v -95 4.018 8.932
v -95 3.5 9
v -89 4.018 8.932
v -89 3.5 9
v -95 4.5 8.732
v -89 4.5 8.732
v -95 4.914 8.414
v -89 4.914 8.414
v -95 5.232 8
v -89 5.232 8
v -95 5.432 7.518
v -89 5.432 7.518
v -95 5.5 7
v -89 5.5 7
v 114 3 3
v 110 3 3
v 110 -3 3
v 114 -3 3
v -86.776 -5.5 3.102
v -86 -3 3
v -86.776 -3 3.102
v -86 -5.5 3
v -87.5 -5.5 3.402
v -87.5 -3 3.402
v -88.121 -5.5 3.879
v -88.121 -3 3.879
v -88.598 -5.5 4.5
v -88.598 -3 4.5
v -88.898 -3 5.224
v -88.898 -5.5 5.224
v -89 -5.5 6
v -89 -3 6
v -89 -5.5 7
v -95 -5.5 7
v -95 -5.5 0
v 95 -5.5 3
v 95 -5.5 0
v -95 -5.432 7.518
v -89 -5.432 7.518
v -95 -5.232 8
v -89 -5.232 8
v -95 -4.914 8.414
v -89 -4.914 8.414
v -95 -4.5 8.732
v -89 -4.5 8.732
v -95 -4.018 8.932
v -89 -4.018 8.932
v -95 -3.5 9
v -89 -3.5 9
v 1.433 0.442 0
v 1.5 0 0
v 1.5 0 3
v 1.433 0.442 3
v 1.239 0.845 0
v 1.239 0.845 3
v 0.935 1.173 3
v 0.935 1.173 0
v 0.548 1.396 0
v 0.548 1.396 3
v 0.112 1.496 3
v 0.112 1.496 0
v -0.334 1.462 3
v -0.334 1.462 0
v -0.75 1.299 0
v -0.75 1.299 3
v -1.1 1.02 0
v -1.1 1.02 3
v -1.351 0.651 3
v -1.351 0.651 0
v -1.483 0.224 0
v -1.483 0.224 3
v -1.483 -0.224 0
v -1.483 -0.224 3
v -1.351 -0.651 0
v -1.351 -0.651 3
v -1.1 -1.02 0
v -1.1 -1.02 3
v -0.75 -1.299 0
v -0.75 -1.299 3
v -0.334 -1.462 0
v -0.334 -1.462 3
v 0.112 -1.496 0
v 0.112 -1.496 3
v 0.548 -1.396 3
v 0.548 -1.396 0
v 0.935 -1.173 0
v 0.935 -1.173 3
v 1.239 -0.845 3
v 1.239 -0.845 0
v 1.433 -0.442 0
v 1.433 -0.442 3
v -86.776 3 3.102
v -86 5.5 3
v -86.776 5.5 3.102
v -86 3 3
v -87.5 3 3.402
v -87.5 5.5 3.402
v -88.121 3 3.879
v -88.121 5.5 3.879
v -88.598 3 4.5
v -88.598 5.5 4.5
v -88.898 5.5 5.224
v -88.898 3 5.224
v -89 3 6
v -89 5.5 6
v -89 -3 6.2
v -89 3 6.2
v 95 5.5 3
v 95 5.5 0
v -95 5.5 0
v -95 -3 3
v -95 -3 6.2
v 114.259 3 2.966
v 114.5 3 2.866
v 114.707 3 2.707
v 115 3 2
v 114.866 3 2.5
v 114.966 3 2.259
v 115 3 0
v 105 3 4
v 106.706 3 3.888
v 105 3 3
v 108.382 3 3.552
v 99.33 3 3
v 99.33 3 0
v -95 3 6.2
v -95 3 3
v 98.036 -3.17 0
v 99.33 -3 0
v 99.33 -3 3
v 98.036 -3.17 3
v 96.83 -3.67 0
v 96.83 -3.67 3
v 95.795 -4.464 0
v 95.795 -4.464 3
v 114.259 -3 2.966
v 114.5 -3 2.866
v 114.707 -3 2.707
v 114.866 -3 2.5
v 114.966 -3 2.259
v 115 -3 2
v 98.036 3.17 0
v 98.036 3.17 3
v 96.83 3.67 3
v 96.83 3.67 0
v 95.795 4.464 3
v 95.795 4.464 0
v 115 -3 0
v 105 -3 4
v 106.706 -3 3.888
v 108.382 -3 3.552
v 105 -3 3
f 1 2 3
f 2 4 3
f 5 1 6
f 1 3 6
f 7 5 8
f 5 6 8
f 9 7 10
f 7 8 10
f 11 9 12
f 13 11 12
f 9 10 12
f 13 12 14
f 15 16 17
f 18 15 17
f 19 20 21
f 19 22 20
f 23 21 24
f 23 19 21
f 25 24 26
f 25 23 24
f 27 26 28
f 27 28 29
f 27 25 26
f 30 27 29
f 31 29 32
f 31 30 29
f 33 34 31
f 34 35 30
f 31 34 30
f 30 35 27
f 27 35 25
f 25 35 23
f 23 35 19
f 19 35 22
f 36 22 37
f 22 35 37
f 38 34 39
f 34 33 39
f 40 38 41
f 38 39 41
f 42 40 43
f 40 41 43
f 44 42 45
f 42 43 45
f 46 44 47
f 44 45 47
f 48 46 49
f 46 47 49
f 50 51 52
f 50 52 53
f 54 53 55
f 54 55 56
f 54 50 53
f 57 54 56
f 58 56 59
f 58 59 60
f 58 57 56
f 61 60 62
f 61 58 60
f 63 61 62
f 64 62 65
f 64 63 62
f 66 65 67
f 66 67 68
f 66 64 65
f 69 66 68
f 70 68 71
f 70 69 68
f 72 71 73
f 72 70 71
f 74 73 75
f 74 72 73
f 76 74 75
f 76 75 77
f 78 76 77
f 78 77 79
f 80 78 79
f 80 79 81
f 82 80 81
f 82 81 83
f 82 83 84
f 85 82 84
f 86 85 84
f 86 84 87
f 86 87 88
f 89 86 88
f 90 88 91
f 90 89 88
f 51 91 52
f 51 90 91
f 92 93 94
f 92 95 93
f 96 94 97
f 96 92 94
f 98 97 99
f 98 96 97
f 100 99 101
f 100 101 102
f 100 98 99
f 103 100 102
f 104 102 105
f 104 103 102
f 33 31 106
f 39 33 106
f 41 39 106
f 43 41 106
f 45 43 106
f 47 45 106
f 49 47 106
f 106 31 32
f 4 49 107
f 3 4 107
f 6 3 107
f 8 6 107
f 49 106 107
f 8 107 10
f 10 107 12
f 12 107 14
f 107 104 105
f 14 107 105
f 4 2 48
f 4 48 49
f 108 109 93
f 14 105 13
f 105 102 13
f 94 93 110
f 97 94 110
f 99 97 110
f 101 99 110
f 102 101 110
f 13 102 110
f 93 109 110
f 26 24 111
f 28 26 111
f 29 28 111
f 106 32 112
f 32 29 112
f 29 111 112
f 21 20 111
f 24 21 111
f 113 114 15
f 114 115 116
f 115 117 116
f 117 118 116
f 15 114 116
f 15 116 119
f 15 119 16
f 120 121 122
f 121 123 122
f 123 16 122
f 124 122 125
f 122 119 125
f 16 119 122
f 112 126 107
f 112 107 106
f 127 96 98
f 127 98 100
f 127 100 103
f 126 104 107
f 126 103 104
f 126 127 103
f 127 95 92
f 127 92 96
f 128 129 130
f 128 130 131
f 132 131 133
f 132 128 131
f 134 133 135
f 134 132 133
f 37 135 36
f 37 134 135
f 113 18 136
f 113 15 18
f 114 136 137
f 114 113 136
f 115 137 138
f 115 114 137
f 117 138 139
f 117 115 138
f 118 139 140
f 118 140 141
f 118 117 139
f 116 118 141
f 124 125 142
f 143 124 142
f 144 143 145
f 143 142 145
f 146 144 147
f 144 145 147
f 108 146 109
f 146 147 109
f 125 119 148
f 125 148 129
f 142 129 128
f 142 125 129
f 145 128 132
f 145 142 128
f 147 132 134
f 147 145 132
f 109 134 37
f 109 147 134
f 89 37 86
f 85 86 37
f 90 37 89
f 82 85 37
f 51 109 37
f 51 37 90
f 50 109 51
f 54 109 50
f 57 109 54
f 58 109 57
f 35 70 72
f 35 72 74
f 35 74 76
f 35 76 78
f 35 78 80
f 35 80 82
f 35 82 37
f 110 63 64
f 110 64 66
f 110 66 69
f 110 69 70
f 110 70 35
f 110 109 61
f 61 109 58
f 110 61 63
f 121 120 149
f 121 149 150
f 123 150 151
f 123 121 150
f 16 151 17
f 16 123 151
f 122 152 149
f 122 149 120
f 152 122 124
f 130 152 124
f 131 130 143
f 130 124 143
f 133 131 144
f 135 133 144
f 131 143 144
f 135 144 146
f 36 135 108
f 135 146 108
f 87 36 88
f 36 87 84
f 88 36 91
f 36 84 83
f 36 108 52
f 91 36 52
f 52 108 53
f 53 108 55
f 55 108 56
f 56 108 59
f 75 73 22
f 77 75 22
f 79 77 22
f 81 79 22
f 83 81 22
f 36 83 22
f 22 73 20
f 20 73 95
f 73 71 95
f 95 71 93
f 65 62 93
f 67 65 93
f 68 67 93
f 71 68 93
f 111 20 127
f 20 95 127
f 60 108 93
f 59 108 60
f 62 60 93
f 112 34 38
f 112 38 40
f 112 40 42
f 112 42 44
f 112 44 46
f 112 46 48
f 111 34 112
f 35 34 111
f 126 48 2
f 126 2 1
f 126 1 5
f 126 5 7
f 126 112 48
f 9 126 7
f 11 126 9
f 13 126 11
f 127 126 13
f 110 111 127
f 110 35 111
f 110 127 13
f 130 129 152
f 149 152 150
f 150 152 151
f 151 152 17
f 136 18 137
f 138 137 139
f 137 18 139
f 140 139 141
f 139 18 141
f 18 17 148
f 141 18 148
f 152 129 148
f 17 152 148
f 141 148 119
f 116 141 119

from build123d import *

# Parameters (mm, degrees)
F0_W         = 6
F0_H         = 11
F0_R         = 1.5
F1_DEPTH     = 3
F2_DEPTH     = 9
F3_W         = 6
F3_H         = 3.2
F4_DEPTH     = 15
F5_W         = 5
F5_H         = 6
F6_DEPTH     = 1
F7_T1_DEPTH  = 31
F8_R         = 3
F9_R         = 1
F10_T1_DEPTH = 3
F11_R        = 2


# Not quite as in the source:
# - a fillet or chamfer that OpenCascade refuses, or shapes differently, is made with other operations: its cross-section is extruded or revolved along the edge and cut away or added


with BuildPart() as f1:
    # F0 (on Top) → F1 (new body)
    with BuildSketch(Plane.XY):
        with Locations((-92, 0)):
            Rectangle(F0_W, F0_H)
        Polygon((-89, -5.5), (95, -5.5), (95, -3), (115, -3), (115, 3), (95, 3), (95, 5.5), (-89, 5.5), align=None)
        Circle(F0_R, mode=Mode.SUBTRACT)
    extrude(amount=F1_DEPTH)

    # F0 (on Top) → F2 (join)
    with BuildSketch(Plane.XY):
        with Locations((-92, 0)):
            Rectangle(F0_W, F0_H)
    extrude(amount=F2_DEPTH)

    # F3 (on face) → F4 (cut, symmetric)
    with BuildSketch(Plane(origin=(-95, 0, 0), x_dir=(0, -1, 0), z_dir=(-1, 0, 0))):
        with Locations((0, 4.6)):
            Rectangle(F3_W, F3_H)
    extrude(amount=F4_DEPTH, both=True, mode=Mode.SUBTRACT)

    # F5 (on face) → F6 (join)
    with BuildSketch(Plane.XY.offset(3)):
        with Locations((107.5, 0)):
            Rectangle(F5_W, F5_H)
    extrude(amount=F6_DEPTH)

    # F7: fillet of radius 13 on 1 edges, made by hand

    # F7_s2 → F7_t1 (cut)
    with BuildSketch(Plane.XZ.offset(-15.5)):
        with BuildLine():
            ThreePointArc((105, 4), (107.5495097568, 3.747548784), (110, 3))
            Line((110, 3), (110, 4))
            Line((110, 4), (105, 4))
        make_face()
    extrude(amount=F7_T1_DEPTH, mode=Mode.SUBTRACT)

    # F8
    f8_edges = [f1.edges().sort_by_distance(p)[0] for p in [
        (-89, -4.25, 3),
        (-89, 4.25, 3),
    ]]
    fillet(f8_edges, radius=F8_R)

    # F9
    f9_edges = [f1.edges().sort_by_distance(p)[0] for p in [
        (115, 0, 3),
    ]]
    fillet(f9_edges, radius=F9_R)

    # F10: fillet of radius 5 on 2 edges, made by hand

    # F10_s2 → F10_t1 (join)
    with BuildSketch(Plane.XY):
        with BuildLine():
            ThreePointArc((99.3301270189, -3), (96.8301270189, -3.6698729811), (95, -5.5))
            Line((95, -5.5), (95, -3))
            Line((95, -3), (99.3301270189, -3))
        make_face()
        with BuildLine():
            ThreePointArc((99.3301270189, 3), (96.8301270189, 3.6698729811), (95, 5.5))
            Line((95, 5.5), (95, 3))
            Line((95, 3), (99.3301270189, 3))
        make_face()
    extrude(amount=F10_T1_DEPTH)

    # F11
    f11_edges = [f1.edges().sort_by_distance(p)[0] for p in [
        (-92, 5.5, 9),
        (-92, -5.5, 9),
    ]]
    fillet(f11_edges, radius=F11_R)


solid = f1.part
